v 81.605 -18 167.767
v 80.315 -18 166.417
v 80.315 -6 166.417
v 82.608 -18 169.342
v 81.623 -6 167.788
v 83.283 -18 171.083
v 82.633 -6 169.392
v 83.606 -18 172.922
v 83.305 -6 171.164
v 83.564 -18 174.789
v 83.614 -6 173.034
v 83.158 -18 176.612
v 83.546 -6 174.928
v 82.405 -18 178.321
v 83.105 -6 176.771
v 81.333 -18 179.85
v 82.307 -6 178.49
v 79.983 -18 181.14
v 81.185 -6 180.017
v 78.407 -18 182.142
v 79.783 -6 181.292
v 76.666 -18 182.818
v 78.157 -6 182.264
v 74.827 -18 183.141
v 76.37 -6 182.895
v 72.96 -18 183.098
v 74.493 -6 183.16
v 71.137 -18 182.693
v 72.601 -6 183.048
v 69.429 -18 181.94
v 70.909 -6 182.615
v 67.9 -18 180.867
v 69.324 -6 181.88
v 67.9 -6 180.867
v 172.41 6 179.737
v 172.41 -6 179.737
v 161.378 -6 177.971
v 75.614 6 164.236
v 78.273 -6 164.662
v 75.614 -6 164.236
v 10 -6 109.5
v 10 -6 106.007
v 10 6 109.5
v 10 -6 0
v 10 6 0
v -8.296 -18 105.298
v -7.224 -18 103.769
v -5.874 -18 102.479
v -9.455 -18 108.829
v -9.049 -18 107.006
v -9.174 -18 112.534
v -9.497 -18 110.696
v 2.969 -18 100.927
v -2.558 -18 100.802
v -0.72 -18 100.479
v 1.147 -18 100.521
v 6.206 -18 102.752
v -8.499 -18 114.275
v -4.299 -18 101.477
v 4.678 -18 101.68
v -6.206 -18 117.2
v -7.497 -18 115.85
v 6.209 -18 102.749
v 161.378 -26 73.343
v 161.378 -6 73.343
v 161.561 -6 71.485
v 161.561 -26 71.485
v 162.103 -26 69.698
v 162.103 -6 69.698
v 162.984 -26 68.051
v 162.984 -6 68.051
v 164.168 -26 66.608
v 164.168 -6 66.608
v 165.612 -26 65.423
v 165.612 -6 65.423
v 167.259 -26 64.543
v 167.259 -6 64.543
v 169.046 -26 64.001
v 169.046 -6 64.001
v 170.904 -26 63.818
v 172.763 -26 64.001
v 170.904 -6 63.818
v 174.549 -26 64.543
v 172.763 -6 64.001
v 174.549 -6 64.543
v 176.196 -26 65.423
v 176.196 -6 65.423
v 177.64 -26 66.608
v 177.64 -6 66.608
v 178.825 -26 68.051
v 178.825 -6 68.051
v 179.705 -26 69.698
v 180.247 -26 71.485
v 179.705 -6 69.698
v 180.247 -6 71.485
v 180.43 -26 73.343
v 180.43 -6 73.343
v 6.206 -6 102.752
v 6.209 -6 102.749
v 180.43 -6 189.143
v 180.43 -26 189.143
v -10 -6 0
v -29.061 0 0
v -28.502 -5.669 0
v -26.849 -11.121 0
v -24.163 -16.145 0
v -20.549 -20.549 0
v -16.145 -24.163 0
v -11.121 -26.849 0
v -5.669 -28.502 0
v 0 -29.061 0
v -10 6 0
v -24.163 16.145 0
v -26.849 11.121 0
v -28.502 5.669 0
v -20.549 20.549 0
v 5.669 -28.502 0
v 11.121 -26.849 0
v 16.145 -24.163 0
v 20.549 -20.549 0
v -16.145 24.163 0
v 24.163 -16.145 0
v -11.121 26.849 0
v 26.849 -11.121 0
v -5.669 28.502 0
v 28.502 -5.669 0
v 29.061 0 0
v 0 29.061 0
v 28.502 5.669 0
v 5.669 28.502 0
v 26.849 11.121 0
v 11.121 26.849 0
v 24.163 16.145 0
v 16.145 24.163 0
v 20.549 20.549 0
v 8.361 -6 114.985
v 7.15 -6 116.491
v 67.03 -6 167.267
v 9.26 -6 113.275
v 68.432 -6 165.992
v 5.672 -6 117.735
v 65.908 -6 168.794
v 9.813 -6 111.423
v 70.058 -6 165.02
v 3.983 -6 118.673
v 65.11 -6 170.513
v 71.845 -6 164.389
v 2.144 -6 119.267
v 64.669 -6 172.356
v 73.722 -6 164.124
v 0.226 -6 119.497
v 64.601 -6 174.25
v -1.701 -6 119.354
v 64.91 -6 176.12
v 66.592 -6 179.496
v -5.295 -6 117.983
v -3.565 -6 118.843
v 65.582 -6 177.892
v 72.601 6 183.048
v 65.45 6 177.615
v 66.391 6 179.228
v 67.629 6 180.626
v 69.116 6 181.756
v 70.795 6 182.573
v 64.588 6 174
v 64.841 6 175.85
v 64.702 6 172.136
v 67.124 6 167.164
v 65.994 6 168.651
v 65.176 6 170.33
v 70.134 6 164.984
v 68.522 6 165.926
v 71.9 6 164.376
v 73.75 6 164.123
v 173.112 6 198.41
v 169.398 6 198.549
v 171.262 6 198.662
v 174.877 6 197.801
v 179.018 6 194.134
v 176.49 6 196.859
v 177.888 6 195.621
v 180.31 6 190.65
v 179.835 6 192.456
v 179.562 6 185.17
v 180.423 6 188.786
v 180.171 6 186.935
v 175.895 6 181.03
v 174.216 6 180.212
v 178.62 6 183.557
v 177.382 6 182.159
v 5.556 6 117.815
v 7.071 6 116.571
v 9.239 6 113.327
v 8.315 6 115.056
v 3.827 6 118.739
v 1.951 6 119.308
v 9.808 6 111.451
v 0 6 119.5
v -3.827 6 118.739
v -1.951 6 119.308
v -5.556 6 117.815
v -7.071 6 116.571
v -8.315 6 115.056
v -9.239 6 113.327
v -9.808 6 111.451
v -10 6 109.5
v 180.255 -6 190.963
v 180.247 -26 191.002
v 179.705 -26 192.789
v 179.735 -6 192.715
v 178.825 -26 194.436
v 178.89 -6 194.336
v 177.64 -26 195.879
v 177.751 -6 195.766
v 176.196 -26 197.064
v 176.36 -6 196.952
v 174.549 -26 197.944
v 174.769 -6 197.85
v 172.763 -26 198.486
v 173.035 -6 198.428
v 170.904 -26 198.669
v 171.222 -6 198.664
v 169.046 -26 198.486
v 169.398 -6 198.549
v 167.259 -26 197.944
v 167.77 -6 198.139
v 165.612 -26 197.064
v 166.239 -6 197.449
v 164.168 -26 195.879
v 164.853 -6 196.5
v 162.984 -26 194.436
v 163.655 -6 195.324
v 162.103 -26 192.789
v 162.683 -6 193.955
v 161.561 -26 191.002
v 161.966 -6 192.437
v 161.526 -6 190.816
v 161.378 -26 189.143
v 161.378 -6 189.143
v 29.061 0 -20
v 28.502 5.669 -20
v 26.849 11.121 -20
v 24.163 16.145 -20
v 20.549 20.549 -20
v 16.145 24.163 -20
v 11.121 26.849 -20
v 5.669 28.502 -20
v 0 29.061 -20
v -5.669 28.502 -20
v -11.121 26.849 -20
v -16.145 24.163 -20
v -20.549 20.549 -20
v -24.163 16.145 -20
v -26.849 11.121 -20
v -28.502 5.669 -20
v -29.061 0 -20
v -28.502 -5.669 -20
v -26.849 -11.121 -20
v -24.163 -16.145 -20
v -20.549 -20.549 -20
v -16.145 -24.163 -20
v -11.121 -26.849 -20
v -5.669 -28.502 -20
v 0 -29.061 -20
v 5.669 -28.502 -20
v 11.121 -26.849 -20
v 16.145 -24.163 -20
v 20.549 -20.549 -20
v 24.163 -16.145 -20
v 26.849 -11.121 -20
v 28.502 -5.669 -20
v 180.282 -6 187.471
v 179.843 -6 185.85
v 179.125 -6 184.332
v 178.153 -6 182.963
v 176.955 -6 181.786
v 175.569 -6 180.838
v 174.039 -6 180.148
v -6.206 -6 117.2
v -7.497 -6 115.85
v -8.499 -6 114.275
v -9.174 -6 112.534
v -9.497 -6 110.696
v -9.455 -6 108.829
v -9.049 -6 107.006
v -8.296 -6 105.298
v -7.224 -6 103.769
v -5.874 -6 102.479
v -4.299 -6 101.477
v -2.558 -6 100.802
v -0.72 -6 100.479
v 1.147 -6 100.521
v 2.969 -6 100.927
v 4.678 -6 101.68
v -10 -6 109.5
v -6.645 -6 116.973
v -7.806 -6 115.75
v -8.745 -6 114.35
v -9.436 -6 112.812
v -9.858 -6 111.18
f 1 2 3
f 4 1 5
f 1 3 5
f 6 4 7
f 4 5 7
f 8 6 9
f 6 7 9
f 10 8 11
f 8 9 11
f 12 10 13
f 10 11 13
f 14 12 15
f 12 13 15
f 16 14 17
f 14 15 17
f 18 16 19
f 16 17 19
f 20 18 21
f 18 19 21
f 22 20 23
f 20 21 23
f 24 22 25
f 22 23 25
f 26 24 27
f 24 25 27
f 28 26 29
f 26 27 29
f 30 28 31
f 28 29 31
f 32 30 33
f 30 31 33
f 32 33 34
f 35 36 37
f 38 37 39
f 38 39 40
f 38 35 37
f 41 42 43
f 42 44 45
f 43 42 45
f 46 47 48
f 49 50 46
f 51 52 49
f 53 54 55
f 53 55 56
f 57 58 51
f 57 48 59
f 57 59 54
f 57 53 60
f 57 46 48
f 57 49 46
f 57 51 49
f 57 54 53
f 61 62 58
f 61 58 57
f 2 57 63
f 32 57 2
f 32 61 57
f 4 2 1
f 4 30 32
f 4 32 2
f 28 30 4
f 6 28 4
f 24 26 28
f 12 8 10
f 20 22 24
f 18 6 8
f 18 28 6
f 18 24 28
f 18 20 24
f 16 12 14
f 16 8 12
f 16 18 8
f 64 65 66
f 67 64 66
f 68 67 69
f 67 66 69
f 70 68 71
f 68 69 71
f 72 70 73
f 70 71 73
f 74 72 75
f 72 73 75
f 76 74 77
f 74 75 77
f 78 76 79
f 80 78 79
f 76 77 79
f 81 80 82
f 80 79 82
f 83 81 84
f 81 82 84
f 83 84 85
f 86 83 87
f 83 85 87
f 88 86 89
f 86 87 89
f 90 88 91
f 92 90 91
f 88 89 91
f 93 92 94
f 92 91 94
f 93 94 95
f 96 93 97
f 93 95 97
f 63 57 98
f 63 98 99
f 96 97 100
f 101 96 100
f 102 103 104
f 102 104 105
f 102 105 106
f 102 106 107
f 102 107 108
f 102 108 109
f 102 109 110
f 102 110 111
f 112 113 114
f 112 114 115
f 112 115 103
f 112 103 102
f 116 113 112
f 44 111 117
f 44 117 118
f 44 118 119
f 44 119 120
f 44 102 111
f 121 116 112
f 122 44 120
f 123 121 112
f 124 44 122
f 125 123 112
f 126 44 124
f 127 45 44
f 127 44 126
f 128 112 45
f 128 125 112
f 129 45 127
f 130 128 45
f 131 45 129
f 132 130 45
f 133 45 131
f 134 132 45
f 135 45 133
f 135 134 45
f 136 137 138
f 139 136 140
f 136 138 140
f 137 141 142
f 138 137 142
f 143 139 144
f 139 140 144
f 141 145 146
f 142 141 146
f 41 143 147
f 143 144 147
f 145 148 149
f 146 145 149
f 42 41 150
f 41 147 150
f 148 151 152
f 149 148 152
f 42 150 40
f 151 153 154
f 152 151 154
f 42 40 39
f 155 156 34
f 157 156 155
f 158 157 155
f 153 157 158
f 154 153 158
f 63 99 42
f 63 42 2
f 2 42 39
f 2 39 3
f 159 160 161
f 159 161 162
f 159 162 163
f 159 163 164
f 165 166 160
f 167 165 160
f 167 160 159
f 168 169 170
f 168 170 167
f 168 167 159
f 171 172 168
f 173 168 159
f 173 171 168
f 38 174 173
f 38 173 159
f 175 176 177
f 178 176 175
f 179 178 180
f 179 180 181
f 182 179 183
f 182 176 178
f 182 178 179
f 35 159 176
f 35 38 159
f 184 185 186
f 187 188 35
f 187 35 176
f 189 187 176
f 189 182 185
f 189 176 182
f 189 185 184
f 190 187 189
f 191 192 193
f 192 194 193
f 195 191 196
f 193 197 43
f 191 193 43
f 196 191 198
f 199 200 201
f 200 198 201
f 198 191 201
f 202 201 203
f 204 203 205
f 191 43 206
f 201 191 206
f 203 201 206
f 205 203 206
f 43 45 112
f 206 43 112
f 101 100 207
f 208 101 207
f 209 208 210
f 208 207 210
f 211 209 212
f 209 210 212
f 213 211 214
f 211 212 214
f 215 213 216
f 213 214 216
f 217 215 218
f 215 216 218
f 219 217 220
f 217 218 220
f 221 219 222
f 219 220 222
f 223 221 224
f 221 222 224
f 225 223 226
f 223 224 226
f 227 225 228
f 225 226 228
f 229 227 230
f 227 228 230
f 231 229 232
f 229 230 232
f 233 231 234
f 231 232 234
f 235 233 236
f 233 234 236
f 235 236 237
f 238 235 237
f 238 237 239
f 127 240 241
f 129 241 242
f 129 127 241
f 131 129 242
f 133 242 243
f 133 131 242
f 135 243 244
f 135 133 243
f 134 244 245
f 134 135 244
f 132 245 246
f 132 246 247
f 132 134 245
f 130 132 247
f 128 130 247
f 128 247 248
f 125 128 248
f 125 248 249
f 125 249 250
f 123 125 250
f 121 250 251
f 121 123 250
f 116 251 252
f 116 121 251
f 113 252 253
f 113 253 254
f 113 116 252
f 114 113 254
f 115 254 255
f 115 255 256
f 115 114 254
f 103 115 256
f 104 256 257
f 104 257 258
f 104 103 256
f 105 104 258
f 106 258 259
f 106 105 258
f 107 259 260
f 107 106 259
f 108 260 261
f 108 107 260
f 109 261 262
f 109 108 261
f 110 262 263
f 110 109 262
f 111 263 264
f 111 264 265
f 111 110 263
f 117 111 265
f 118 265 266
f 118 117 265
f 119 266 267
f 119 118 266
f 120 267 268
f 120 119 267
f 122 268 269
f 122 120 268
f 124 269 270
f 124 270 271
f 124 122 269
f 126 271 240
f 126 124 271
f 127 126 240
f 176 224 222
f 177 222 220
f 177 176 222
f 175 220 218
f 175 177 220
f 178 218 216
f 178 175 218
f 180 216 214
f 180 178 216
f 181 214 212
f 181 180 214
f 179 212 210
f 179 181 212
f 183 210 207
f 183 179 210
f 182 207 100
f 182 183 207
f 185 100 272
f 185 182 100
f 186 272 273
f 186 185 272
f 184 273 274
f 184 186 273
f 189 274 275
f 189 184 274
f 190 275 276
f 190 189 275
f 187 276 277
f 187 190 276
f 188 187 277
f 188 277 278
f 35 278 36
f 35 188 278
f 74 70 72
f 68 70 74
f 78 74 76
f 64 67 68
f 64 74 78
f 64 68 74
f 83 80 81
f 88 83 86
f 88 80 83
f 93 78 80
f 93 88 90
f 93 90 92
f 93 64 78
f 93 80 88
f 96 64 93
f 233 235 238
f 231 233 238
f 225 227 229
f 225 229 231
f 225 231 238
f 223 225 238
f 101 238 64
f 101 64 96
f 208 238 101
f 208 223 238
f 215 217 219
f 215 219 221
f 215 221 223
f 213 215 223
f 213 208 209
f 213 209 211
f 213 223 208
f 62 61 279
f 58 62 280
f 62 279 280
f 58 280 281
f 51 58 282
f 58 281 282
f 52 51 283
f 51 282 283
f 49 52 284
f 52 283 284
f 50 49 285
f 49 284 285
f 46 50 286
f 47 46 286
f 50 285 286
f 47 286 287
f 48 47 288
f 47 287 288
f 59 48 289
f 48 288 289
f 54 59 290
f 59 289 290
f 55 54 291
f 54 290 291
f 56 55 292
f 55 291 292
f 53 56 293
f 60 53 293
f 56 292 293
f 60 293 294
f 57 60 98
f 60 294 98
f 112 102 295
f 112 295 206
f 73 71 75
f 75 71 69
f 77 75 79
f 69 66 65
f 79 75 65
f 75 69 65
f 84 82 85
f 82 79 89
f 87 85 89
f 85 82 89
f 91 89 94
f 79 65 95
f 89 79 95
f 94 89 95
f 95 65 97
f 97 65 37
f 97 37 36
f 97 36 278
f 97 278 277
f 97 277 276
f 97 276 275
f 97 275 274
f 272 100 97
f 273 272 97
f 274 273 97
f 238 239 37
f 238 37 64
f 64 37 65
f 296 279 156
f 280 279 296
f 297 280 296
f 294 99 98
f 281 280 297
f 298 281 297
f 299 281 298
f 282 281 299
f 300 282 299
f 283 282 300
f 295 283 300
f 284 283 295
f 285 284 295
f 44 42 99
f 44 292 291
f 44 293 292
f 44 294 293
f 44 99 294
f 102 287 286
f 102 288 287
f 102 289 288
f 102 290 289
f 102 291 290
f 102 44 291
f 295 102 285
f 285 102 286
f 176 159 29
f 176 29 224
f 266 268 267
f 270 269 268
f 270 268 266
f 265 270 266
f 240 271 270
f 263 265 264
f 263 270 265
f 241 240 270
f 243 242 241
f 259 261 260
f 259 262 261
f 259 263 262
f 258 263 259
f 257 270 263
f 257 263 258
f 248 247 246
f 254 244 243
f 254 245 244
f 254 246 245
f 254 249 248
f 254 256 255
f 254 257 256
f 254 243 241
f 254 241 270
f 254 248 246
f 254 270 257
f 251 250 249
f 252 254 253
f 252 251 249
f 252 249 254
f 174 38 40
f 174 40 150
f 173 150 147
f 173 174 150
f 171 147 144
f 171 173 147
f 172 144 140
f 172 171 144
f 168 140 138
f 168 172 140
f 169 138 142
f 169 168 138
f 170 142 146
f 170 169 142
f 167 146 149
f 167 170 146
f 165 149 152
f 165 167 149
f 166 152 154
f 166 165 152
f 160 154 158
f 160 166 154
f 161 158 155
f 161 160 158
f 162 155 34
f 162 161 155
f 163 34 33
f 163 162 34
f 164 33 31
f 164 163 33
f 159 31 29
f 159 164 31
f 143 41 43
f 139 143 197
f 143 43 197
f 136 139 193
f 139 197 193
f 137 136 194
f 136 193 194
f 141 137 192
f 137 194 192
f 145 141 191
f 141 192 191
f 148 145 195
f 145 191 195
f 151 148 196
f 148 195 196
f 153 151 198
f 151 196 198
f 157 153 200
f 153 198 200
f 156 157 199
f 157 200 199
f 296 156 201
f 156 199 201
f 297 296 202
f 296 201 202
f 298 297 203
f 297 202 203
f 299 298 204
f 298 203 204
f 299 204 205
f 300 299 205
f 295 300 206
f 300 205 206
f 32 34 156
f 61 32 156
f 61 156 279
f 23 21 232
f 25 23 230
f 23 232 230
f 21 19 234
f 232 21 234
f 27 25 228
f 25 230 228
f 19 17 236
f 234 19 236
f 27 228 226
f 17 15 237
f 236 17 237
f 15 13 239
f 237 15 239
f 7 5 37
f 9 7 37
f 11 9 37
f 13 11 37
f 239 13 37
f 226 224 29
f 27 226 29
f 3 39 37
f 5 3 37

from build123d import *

# Parameters (mm, degrees)
SKETCH1_R           = 29.060848553
BOSS_EXTRUDE1_DEPTH = 20
SKETCH2_W           = 20
SKETCH2_H           = 12
BOSS_EXTRUDE2_DEPTH = 139.5
FILLET2_R           = 10
BOSS_EXTRUDE3_DEPTH = 12
BOSS_EXTRUDE4_START = 12
BOSS_EXTRUDE4_DEPTH = 12
BOSS_EXTRUDE6_DEPTH = 20


with BuildPart() as part:
    # Sketch1 → Boss-Extrude1 (new body)
    with BuildSketch(Plane.XY):
        Circle(SKETCH1_R)
    extrude(amount=-BOSS_EXTRUDE1_DEPTH)

    # Sketch2 → Boss-Extrude2 (add)
    with BuildSketch(Plane(origin=(0, 0, -20), x_dir=(-1, 0, 0), z_dir=(0, 0, -1))):
        Rectangle(SKETCH2_W, SKETCH2_H)
    extrude(amount=-BOSS_EXTRUDE2_DEPTH)

    # Fillet2
    # the kernel refuses this fillet: 10 mm, written as the material it takes off along each edge
    with BuildSketch(Plane(origin=(10, -31, 119.5), x_dir=(0, 0, -1), z_dir=(0, 1, 0)), Plane(origin=(-10, 31, 119.5), x_dir=(0, 0, -1), z_dir=(0, -1, 0))) as fillet2_piece_1:
        with BuildLine():
            CenterArc((FILLET2_R, FILLET2_R), FILLET2_R, 180, 90)
            Line((0, FILLET2_R), (0, 0))
            Line((0, 0), (FILLET2_R, 0))
        make_face()
    extrude(amount=62, mode=Mode.SUBTRACT)

    # Sketch3 → Boss-Extrude3 (add)
    with BuildSketch(Plane.XZ.offset(6)):
        with BuildLine():
            Line((6.20869835, 102.749264082), (80.315076986, 166.416639129))
            ThreePointArc((80.315076986, 166.416639129), (81.332881571, 179.849603019), (67.899917681, 180.867407604))
            Line((67.899917681, 180.867407604), (-6.206460955, 117.200032557))
            ThreePointArc((-6.206460955, 117.200032557), (-7.224082117, 103.769489485), (6.206460955, 102.751868323))
            Line((6.206460955, 102.751868323), (6.20869835, 102.749264082))
        make_face()
    extrude(amount=BOSS_EXTRUDE3_DEPTH)

    # Sketch4 → Boss-Extrude4 (add)
    with BuildSketch(Plane(origin=(0, -6, 0), x_dir=(1, 0, 0), z_dir=(0, 1, 0)).offset(BOSS_EXTRUDE4_START)):
        with BuildLine():
            Line((72.601205927, -183.04794218), (169.39785175, -198.549240748))
            ThreePointArc((169.39785175, -198.549240748), (180.31006197, -190.649613341), (172.410434564, -179.737403121))
            Line((172.410434564, -179.737403121), (75.613788741, -164.236104553))
            ThreePointArc((75.613788741, -164.236104553), (64.70157852, -172.13573196), (72.601205927, -183.04794218))
        make_face()
    extrude(amount=-BOSS_EXTRUDE4_DEPTH)

    # Sketch5 → Boss-Extrude6 (add)
    with BuildSketch(Plane.XZ.offset(6)):
        with BuildLine():
            Line((161.378376914, 189.143321934), (161.378376914, 73.343321934))
            ThreePointArc((161.378376914, 73.343321934), (170.904143157, 63.817555691), (180.429909401, 73.343321934))
            Line((180.429909401, 73.343321934), (180.429909401, 189.143321934))
            ThreePointArc((180.429909401, 189.143321934), (170.904143157, 198.669088178), (161.378376914, 189.143321934))
        make_face()
    extrude(amount=BOSS_EXTRUDE6_DEPTH)


solid = part.part
